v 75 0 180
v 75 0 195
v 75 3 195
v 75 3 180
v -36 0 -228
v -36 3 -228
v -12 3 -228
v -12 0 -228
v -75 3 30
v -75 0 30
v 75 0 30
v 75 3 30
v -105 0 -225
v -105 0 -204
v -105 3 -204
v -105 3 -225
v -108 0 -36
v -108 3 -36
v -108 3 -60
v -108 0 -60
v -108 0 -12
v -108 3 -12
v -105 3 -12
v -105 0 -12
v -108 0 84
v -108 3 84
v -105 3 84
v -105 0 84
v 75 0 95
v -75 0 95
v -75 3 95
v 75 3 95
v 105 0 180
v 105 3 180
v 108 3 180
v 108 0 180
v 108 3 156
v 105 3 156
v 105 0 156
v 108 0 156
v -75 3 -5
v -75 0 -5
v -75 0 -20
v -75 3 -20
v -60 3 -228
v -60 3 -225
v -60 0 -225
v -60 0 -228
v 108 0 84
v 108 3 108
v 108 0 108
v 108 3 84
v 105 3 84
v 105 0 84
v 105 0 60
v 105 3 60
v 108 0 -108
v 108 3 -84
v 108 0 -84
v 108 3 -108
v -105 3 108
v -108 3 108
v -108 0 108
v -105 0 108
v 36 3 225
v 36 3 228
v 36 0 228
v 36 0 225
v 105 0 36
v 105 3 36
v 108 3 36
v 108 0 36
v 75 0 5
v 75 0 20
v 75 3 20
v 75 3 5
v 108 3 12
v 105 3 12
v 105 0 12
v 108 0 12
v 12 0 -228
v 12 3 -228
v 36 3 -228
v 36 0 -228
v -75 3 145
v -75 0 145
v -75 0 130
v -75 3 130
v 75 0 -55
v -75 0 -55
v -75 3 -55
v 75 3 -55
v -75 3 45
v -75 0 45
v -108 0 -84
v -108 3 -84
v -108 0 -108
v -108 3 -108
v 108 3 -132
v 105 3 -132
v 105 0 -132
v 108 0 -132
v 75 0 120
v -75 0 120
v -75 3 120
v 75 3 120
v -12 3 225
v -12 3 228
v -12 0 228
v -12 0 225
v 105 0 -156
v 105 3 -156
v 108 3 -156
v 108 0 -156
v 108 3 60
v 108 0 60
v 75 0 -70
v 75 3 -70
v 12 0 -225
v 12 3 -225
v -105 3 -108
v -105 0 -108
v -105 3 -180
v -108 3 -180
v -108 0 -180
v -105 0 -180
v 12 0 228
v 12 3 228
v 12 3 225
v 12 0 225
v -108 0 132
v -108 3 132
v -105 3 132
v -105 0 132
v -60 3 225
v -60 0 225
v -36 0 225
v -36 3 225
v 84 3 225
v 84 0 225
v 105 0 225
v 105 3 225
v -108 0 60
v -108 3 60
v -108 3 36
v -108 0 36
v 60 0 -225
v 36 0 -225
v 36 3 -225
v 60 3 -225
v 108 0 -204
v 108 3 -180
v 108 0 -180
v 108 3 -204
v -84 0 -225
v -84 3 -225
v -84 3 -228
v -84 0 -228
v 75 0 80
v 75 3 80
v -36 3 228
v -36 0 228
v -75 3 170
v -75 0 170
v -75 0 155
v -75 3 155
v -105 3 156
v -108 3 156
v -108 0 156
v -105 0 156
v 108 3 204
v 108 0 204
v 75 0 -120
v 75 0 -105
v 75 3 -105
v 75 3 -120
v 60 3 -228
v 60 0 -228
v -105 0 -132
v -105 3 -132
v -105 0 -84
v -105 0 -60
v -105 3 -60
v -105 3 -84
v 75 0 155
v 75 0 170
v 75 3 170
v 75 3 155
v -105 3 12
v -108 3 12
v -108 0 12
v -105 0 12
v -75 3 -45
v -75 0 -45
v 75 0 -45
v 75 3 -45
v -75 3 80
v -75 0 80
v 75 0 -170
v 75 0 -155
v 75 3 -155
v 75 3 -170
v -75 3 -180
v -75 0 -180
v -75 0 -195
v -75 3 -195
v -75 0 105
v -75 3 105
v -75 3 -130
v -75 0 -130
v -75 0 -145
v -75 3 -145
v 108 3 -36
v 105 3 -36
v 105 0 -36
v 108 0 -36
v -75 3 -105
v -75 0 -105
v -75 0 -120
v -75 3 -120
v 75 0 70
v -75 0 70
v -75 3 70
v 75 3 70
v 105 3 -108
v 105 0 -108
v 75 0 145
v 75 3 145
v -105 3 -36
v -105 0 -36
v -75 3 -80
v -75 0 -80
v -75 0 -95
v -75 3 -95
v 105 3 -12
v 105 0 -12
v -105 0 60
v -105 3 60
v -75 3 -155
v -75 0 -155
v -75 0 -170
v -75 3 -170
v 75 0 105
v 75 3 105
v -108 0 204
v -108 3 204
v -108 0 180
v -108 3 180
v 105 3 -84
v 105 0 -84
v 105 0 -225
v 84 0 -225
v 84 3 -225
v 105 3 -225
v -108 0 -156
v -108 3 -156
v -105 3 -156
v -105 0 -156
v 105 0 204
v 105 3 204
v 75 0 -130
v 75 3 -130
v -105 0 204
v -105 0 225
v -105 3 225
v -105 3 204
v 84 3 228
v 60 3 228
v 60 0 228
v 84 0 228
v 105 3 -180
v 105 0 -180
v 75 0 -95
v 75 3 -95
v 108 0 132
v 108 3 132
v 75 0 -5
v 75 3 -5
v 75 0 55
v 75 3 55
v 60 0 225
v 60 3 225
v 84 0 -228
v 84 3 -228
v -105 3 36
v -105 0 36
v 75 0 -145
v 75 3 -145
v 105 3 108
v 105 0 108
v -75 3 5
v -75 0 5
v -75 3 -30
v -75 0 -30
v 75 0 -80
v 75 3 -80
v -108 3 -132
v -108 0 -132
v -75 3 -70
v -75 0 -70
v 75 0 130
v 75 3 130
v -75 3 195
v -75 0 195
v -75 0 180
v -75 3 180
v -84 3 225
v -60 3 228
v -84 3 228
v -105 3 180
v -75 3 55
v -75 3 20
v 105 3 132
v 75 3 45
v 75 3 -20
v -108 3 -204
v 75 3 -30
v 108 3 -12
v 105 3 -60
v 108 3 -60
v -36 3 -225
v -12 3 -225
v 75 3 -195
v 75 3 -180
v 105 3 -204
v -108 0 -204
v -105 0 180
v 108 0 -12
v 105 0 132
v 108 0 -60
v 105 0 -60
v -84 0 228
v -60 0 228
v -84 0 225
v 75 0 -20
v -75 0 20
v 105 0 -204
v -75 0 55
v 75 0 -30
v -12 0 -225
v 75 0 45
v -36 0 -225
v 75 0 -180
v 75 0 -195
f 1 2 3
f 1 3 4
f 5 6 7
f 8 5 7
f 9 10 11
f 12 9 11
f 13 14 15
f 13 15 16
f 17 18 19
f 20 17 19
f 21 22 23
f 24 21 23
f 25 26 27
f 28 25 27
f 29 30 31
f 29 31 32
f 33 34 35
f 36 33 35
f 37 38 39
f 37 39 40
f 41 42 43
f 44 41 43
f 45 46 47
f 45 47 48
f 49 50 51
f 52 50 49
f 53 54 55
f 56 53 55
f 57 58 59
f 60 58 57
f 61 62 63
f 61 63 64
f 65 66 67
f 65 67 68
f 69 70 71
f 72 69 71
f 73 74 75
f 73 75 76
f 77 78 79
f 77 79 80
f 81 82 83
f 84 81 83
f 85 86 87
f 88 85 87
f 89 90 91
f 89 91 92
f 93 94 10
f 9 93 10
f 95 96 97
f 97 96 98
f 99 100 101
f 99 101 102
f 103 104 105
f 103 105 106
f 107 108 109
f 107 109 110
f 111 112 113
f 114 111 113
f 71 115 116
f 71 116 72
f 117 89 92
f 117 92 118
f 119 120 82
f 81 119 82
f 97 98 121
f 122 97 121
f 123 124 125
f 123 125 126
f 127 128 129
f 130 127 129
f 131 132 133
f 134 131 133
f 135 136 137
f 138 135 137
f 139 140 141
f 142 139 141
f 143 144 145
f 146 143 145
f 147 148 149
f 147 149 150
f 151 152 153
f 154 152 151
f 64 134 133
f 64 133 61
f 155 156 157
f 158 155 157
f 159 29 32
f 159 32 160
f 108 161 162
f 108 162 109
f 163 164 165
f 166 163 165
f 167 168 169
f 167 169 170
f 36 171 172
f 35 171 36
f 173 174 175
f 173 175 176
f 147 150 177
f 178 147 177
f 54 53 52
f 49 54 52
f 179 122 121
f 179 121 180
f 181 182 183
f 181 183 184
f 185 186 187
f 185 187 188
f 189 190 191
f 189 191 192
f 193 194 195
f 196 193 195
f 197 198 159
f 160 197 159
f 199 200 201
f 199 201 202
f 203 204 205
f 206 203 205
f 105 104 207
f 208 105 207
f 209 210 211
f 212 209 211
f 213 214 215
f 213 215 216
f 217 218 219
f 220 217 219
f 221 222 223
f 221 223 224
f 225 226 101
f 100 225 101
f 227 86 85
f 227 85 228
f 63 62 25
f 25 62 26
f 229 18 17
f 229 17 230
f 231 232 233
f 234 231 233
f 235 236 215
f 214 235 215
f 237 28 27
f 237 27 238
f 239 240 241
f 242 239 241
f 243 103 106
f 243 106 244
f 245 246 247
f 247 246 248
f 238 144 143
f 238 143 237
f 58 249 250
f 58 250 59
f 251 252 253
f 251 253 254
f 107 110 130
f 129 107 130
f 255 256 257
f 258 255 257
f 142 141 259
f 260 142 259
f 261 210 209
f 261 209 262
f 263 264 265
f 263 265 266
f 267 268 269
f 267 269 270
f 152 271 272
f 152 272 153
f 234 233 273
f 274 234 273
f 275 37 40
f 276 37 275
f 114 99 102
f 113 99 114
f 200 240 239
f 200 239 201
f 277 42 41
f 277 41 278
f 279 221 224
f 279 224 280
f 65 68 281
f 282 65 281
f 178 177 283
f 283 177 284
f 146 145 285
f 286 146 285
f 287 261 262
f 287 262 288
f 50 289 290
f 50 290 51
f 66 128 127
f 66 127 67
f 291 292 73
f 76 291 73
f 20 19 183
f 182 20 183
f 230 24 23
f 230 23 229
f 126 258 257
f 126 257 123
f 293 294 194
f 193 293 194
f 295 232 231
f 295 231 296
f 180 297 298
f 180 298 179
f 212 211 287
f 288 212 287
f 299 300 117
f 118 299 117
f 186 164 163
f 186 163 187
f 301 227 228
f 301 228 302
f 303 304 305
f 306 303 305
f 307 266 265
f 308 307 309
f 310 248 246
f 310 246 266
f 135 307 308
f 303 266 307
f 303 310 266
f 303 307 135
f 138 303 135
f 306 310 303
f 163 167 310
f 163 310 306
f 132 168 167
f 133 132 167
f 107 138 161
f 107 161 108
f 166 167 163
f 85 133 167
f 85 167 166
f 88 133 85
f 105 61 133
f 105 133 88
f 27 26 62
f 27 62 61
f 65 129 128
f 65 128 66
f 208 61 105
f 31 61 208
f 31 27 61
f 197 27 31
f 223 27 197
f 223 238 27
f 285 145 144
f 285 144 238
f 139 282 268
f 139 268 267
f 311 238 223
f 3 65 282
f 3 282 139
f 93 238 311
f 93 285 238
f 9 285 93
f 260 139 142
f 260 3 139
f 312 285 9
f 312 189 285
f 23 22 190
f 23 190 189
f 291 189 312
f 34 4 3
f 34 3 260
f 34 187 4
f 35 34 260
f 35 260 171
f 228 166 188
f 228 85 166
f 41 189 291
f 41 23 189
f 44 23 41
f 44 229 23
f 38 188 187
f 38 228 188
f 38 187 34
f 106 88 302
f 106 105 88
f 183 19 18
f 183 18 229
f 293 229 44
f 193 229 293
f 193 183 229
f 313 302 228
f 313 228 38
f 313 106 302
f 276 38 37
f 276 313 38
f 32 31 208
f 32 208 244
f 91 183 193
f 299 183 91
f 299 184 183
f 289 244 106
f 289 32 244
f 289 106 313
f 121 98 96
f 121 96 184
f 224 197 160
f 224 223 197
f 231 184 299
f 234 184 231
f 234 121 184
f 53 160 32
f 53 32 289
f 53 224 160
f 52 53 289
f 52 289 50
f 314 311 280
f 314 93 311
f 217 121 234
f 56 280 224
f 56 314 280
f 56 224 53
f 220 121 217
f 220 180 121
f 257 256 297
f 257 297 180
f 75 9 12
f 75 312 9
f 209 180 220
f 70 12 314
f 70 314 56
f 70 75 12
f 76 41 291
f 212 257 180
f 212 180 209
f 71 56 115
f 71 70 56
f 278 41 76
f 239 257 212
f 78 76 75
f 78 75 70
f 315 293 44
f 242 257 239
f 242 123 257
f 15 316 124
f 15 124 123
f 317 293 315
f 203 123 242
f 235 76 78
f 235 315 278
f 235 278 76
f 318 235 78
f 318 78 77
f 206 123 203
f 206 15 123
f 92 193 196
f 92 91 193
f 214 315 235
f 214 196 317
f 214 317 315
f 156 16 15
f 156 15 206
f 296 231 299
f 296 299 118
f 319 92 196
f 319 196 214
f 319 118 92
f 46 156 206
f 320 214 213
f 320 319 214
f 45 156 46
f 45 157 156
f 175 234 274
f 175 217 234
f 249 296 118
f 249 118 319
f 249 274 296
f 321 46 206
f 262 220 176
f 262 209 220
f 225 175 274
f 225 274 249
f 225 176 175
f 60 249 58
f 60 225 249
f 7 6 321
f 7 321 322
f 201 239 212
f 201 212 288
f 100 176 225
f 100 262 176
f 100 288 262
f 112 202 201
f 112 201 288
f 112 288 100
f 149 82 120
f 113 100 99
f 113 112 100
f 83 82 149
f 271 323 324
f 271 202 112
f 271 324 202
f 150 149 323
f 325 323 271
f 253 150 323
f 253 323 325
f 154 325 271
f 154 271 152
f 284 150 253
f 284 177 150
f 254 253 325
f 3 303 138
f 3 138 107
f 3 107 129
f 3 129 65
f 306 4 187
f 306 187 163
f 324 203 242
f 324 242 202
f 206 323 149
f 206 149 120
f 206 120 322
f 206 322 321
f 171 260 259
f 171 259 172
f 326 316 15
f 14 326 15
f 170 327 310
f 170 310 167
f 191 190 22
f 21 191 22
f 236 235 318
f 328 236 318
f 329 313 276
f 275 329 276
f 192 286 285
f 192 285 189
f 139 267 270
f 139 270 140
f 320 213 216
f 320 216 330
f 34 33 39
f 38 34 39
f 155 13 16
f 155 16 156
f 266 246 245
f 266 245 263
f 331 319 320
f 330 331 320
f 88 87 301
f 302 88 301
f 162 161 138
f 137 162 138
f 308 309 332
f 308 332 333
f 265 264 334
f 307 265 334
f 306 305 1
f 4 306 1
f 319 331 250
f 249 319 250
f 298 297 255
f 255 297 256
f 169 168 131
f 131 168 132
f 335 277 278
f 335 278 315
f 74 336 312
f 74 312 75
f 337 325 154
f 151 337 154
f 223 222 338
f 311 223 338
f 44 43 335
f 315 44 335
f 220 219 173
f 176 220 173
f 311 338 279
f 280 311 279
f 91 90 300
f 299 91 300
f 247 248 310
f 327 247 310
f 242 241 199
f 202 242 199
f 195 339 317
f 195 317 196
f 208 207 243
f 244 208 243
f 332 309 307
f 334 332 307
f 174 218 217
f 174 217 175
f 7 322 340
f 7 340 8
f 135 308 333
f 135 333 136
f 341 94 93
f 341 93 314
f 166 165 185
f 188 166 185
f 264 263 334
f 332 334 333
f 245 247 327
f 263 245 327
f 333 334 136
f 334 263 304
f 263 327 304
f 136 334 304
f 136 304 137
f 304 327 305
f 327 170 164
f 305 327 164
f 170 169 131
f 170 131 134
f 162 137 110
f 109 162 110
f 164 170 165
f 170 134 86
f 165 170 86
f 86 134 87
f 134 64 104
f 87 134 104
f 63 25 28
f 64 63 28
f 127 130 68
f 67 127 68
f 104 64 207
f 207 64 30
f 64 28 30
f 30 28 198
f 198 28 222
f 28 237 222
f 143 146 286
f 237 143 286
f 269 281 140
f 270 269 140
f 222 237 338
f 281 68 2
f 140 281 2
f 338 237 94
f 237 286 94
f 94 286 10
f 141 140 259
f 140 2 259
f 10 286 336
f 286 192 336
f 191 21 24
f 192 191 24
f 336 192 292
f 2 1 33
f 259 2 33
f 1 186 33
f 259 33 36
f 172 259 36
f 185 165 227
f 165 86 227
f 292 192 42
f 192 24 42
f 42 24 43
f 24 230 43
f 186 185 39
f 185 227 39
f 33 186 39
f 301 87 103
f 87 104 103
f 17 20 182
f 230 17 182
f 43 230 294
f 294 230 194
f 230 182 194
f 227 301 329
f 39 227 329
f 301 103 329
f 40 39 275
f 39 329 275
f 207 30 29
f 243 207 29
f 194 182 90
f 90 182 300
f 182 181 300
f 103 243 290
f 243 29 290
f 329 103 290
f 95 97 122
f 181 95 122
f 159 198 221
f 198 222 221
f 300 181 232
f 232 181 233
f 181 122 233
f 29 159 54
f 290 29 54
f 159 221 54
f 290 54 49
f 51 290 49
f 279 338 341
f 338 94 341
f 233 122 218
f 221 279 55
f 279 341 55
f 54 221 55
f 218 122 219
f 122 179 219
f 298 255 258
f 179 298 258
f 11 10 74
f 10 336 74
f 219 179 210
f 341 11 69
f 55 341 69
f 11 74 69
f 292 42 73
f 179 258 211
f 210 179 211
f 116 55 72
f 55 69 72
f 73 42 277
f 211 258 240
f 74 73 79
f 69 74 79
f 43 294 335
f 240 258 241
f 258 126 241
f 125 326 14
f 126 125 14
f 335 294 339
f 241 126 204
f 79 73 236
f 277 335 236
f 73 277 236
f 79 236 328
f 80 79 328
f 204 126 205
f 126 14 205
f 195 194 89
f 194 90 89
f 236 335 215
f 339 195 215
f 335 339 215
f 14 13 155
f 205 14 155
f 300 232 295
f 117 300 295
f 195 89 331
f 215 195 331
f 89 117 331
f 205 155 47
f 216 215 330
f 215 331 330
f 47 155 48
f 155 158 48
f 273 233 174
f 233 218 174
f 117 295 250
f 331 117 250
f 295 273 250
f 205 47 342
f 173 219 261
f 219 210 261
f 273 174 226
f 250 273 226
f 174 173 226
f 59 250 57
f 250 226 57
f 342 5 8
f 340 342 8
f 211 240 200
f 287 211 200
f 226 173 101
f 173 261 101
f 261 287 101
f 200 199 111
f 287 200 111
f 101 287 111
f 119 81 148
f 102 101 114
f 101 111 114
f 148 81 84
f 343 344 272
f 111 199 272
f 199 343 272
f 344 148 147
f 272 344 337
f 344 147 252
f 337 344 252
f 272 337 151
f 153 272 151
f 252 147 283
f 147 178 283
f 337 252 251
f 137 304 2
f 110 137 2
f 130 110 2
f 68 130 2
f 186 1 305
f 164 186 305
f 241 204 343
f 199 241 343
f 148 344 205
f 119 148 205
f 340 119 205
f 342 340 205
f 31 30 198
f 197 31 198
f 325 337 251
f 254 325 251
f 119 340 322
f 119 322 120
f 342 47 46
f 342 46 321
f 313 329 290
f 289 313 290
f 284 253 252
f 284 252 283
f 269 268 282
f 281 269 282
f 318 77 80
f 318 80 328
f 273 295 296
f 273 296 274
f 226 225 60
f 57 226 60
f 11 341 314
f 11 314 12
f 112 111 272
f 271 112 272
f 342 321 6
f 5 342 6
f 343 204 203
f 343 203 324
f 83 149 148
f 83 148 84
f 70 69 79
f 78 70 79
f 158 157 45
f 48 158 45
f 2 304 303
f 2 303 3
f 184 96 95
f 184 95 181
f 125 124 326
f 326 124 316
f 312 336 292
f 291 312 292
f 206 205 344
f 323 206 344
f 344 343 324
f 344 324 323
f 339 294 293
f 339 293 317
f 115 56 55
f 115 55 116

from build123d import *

# Parameters (mm, degrees)
SKETCH1_W           = 210
SKETCH1_H           = 450
SKETCH1_W_2         = 150
SKETCH1_H_2         = 15
BOSS_EXTRUDE1_DEPTH = 3
SKETCH3_W           = 3
SKETCH3_H           = 24
BOSS_EXTRUDE3_DEPTH = 3
SKETCH2_W           = 24
SKETCH2_H           = 3
BOSS_EXTRUDE4_DEPTH = 3


with BuildPart() as part:
    # Sketch1 → Boss-Extrude1 (new body)
    with BuildSketch(Plane(origin=(0, 0, 0), x_dir=(1, 0, 0), z_dir=(0, 1, 0))):
        Rectangle(SKETCH1_W, SKETCH1_H)
        with Locations((0, -162.5)):
            Rectangle(SKETCH1_W_2, SKETCH1_H_2, mode=Mode.SUBTRACT)
        with Locations((0, -187.5)):
            Rectangle(SKETCH1_W_2, SKETCH1_H_2, mode=Mode.SUBTRACT)
        with Locations((0, -137.5)):
            Rectangle(SKETCH1_W_2, SKETCH1_H_2, mode=Mode.SUBTRACT)
        with Locations((0, -112.5)):
            Rectangle(SKETCH1_W_2, SKETCH1_H_2, mode=Mode.SUBTRACT)
        with Locations((0, -87.5)):
            Rectangle(SKETCH1_W_2, SKETCH1_H_2, mode=Mode.SUBTRACT)
        with Locations((0, -62.5)):
            Rectangle(SKETCH1_W_2, SKETCH1_H_2, mode=Mode.SUBTRACT)
        with Locations((0, -37.5)):
            Rectangle(SKETCH1_W_2, SKETCH1_H_2, mode=Mode.SUBTRACT)
        with Locations((0, -12.5)):
            Rectangle(SKETCH1_W_2, SKETCH1_H_2, mode=Mode.SUBTRACT)
        with Locations((0, 12.5)):
            Rectangle(SKETCH1_W_2, SKETCH1_H_2, mode=Mode.SUBTRACT)
        with Locations((0, 37.5)):
            Rectangle(SKETCH1_W_2, SKETCH1_H_2, mode=Mode.SUBTRACT)
        with Locations((0, 62.5)):
            Rectangle(SKETCH1_W_2, SKETCH1_H_2, mode=Mode.SUBTRACT)
        with Locations((0, 87.5)):
            Rectangle(SKETCH1_W_2, SKETCH1_H_2, mode=Mode.SUBTRACT)
        with Locations((0, 112.5)):
            Rectangle(SKETCH1_W_2, SKETCH1_H_2, mode=Mode.SUBTRACT)
        with Locations((0, 137.5)):
            Rectangle(SKETCH1_W_2, SKETCH1_H_2, mode=Mode.SUBTRACT)
        with Locations((0, 162.5)):
            Rectangle(SKETCH1_W_2, SKETCH1_H_2, mode=Mode.SUBTRACT)
        with Locations((0, 187.5)):
            Rectangle(SKETCH1_W_2, SKETCH1_H_2, mode=Mode.SUBTRACT)
    extrude(amount=BOSS_EXTRUDE1_DEPTH)

    # Sketch3 → Boss-Extrude3 (add)
    with BuildSketch(Plane(origin=(0, 3, 0), x_dir=(1, 0, 0), z_dir=(0, 1, 0))):
        with Locations((-106.5, 192)):
            Rectangle(SKETCH3_W, SKETCH3_H)
        with Locations((106.5, 192)):
            Rectangle(SKETCH3_W, SKETCH3_H)
        with Locations((106.5, 144)):
            Rectangle(SKETCH3_W, SKETCH3_H)
        with Locations((106.5, 96)):
            Rectangle(SKETCH3_W, SKETCH3_H)
        with Locations((106.5, 48)):
            Rectangle(SKETCH3_W, SKETCH3_H)
        with Locations((106.5, 0)):
            Rectangle(SKETCH3_W, SKETCH3_H)
        with Locations((106.5, -48)):
            Rectangle(SKETCH3_W, SKETCH3_H)
        with Locations((106.5, -96)):
            Rectangle(SKETCH3_W, SKETCH3_H)
        with Locations((106.5, -144)):
            Rectangle(SKETCH3_W, SKETCH3_H)
        with Locations((106.5, -192)):
            Rectangle(SKETCH3_W, SKETCH3_H)
        with Locations((-106.5, 144)):
            Rectangle(SKETCH3_W, SKETCH3_H)
        with Locations((-106.5, 96)):
            Rectangle(SKETCH3_W, SKETCH3_H)
        with Locations((-106.5, 48)):
            Rectangle(SKETCH3_W, SKETCH3_H)
        with Locations((-106.5, 0)):
            Rectangle(SKETCH3_W, SKETCH3_H)
        with Locations((-106.5, -48)):
            Rectangle(SKETCH3_W, SKETCH3_H)
        with Locations((-106.5, -96)):
            Rectangle(SKETCH3_W, SKETCH3_H)
        with Locations((-106.5, -144)):
            Rectangle(SKETCH3_W, SKETCH3_H)
        with Locations((-106.5, -192)):
            Rectangle(SKETCH3_W, SKETCH3_H)
    extrude(amount=-BOSS_EXTRUDE3_DEPTH)

    # Sketch2 → Boss-Extrude4 (add)
    with BuildSketch(Plane(origin=(0, 3, 0), x_dir=(1, 0, 0), z_dir=(0, 1, 0))):
        with Locations((-72, 226.5)):
            Rectangle(SKETCH2_W, SKETCH2_H)
        with Locations((-24, 226.5)):
            Rectangle(SKETCH2_W, SKETCH2_H)
        with Locations((24, 226.5)):
            Rectangle(SKETCH2_W, SKETCH2_H)
        with Locations((72, 226.5)):
            Rectangle(SKETCH2_W, SKETCH2_H)
        with Locations((-71.999992971, -226.5)):
            Rectangle(SKETCH2_W, SKETCH2_H)
        with Locations((-23.999992971, -226.5)):
            Rectangle(SKETCH2_W, SKETCH2_H)
        with Locations((24.000007029, -226.5)):
            Rectangle(SKETCH2_W, SKETCH2_H)
        with Locations((72.000007029, -226.5)):
            Rectangle(SKETCH2_W, SKETCH2_H)
    extrude(amount=-BOSS_EXTRUDE4_DEPTH)


solid = part.part
